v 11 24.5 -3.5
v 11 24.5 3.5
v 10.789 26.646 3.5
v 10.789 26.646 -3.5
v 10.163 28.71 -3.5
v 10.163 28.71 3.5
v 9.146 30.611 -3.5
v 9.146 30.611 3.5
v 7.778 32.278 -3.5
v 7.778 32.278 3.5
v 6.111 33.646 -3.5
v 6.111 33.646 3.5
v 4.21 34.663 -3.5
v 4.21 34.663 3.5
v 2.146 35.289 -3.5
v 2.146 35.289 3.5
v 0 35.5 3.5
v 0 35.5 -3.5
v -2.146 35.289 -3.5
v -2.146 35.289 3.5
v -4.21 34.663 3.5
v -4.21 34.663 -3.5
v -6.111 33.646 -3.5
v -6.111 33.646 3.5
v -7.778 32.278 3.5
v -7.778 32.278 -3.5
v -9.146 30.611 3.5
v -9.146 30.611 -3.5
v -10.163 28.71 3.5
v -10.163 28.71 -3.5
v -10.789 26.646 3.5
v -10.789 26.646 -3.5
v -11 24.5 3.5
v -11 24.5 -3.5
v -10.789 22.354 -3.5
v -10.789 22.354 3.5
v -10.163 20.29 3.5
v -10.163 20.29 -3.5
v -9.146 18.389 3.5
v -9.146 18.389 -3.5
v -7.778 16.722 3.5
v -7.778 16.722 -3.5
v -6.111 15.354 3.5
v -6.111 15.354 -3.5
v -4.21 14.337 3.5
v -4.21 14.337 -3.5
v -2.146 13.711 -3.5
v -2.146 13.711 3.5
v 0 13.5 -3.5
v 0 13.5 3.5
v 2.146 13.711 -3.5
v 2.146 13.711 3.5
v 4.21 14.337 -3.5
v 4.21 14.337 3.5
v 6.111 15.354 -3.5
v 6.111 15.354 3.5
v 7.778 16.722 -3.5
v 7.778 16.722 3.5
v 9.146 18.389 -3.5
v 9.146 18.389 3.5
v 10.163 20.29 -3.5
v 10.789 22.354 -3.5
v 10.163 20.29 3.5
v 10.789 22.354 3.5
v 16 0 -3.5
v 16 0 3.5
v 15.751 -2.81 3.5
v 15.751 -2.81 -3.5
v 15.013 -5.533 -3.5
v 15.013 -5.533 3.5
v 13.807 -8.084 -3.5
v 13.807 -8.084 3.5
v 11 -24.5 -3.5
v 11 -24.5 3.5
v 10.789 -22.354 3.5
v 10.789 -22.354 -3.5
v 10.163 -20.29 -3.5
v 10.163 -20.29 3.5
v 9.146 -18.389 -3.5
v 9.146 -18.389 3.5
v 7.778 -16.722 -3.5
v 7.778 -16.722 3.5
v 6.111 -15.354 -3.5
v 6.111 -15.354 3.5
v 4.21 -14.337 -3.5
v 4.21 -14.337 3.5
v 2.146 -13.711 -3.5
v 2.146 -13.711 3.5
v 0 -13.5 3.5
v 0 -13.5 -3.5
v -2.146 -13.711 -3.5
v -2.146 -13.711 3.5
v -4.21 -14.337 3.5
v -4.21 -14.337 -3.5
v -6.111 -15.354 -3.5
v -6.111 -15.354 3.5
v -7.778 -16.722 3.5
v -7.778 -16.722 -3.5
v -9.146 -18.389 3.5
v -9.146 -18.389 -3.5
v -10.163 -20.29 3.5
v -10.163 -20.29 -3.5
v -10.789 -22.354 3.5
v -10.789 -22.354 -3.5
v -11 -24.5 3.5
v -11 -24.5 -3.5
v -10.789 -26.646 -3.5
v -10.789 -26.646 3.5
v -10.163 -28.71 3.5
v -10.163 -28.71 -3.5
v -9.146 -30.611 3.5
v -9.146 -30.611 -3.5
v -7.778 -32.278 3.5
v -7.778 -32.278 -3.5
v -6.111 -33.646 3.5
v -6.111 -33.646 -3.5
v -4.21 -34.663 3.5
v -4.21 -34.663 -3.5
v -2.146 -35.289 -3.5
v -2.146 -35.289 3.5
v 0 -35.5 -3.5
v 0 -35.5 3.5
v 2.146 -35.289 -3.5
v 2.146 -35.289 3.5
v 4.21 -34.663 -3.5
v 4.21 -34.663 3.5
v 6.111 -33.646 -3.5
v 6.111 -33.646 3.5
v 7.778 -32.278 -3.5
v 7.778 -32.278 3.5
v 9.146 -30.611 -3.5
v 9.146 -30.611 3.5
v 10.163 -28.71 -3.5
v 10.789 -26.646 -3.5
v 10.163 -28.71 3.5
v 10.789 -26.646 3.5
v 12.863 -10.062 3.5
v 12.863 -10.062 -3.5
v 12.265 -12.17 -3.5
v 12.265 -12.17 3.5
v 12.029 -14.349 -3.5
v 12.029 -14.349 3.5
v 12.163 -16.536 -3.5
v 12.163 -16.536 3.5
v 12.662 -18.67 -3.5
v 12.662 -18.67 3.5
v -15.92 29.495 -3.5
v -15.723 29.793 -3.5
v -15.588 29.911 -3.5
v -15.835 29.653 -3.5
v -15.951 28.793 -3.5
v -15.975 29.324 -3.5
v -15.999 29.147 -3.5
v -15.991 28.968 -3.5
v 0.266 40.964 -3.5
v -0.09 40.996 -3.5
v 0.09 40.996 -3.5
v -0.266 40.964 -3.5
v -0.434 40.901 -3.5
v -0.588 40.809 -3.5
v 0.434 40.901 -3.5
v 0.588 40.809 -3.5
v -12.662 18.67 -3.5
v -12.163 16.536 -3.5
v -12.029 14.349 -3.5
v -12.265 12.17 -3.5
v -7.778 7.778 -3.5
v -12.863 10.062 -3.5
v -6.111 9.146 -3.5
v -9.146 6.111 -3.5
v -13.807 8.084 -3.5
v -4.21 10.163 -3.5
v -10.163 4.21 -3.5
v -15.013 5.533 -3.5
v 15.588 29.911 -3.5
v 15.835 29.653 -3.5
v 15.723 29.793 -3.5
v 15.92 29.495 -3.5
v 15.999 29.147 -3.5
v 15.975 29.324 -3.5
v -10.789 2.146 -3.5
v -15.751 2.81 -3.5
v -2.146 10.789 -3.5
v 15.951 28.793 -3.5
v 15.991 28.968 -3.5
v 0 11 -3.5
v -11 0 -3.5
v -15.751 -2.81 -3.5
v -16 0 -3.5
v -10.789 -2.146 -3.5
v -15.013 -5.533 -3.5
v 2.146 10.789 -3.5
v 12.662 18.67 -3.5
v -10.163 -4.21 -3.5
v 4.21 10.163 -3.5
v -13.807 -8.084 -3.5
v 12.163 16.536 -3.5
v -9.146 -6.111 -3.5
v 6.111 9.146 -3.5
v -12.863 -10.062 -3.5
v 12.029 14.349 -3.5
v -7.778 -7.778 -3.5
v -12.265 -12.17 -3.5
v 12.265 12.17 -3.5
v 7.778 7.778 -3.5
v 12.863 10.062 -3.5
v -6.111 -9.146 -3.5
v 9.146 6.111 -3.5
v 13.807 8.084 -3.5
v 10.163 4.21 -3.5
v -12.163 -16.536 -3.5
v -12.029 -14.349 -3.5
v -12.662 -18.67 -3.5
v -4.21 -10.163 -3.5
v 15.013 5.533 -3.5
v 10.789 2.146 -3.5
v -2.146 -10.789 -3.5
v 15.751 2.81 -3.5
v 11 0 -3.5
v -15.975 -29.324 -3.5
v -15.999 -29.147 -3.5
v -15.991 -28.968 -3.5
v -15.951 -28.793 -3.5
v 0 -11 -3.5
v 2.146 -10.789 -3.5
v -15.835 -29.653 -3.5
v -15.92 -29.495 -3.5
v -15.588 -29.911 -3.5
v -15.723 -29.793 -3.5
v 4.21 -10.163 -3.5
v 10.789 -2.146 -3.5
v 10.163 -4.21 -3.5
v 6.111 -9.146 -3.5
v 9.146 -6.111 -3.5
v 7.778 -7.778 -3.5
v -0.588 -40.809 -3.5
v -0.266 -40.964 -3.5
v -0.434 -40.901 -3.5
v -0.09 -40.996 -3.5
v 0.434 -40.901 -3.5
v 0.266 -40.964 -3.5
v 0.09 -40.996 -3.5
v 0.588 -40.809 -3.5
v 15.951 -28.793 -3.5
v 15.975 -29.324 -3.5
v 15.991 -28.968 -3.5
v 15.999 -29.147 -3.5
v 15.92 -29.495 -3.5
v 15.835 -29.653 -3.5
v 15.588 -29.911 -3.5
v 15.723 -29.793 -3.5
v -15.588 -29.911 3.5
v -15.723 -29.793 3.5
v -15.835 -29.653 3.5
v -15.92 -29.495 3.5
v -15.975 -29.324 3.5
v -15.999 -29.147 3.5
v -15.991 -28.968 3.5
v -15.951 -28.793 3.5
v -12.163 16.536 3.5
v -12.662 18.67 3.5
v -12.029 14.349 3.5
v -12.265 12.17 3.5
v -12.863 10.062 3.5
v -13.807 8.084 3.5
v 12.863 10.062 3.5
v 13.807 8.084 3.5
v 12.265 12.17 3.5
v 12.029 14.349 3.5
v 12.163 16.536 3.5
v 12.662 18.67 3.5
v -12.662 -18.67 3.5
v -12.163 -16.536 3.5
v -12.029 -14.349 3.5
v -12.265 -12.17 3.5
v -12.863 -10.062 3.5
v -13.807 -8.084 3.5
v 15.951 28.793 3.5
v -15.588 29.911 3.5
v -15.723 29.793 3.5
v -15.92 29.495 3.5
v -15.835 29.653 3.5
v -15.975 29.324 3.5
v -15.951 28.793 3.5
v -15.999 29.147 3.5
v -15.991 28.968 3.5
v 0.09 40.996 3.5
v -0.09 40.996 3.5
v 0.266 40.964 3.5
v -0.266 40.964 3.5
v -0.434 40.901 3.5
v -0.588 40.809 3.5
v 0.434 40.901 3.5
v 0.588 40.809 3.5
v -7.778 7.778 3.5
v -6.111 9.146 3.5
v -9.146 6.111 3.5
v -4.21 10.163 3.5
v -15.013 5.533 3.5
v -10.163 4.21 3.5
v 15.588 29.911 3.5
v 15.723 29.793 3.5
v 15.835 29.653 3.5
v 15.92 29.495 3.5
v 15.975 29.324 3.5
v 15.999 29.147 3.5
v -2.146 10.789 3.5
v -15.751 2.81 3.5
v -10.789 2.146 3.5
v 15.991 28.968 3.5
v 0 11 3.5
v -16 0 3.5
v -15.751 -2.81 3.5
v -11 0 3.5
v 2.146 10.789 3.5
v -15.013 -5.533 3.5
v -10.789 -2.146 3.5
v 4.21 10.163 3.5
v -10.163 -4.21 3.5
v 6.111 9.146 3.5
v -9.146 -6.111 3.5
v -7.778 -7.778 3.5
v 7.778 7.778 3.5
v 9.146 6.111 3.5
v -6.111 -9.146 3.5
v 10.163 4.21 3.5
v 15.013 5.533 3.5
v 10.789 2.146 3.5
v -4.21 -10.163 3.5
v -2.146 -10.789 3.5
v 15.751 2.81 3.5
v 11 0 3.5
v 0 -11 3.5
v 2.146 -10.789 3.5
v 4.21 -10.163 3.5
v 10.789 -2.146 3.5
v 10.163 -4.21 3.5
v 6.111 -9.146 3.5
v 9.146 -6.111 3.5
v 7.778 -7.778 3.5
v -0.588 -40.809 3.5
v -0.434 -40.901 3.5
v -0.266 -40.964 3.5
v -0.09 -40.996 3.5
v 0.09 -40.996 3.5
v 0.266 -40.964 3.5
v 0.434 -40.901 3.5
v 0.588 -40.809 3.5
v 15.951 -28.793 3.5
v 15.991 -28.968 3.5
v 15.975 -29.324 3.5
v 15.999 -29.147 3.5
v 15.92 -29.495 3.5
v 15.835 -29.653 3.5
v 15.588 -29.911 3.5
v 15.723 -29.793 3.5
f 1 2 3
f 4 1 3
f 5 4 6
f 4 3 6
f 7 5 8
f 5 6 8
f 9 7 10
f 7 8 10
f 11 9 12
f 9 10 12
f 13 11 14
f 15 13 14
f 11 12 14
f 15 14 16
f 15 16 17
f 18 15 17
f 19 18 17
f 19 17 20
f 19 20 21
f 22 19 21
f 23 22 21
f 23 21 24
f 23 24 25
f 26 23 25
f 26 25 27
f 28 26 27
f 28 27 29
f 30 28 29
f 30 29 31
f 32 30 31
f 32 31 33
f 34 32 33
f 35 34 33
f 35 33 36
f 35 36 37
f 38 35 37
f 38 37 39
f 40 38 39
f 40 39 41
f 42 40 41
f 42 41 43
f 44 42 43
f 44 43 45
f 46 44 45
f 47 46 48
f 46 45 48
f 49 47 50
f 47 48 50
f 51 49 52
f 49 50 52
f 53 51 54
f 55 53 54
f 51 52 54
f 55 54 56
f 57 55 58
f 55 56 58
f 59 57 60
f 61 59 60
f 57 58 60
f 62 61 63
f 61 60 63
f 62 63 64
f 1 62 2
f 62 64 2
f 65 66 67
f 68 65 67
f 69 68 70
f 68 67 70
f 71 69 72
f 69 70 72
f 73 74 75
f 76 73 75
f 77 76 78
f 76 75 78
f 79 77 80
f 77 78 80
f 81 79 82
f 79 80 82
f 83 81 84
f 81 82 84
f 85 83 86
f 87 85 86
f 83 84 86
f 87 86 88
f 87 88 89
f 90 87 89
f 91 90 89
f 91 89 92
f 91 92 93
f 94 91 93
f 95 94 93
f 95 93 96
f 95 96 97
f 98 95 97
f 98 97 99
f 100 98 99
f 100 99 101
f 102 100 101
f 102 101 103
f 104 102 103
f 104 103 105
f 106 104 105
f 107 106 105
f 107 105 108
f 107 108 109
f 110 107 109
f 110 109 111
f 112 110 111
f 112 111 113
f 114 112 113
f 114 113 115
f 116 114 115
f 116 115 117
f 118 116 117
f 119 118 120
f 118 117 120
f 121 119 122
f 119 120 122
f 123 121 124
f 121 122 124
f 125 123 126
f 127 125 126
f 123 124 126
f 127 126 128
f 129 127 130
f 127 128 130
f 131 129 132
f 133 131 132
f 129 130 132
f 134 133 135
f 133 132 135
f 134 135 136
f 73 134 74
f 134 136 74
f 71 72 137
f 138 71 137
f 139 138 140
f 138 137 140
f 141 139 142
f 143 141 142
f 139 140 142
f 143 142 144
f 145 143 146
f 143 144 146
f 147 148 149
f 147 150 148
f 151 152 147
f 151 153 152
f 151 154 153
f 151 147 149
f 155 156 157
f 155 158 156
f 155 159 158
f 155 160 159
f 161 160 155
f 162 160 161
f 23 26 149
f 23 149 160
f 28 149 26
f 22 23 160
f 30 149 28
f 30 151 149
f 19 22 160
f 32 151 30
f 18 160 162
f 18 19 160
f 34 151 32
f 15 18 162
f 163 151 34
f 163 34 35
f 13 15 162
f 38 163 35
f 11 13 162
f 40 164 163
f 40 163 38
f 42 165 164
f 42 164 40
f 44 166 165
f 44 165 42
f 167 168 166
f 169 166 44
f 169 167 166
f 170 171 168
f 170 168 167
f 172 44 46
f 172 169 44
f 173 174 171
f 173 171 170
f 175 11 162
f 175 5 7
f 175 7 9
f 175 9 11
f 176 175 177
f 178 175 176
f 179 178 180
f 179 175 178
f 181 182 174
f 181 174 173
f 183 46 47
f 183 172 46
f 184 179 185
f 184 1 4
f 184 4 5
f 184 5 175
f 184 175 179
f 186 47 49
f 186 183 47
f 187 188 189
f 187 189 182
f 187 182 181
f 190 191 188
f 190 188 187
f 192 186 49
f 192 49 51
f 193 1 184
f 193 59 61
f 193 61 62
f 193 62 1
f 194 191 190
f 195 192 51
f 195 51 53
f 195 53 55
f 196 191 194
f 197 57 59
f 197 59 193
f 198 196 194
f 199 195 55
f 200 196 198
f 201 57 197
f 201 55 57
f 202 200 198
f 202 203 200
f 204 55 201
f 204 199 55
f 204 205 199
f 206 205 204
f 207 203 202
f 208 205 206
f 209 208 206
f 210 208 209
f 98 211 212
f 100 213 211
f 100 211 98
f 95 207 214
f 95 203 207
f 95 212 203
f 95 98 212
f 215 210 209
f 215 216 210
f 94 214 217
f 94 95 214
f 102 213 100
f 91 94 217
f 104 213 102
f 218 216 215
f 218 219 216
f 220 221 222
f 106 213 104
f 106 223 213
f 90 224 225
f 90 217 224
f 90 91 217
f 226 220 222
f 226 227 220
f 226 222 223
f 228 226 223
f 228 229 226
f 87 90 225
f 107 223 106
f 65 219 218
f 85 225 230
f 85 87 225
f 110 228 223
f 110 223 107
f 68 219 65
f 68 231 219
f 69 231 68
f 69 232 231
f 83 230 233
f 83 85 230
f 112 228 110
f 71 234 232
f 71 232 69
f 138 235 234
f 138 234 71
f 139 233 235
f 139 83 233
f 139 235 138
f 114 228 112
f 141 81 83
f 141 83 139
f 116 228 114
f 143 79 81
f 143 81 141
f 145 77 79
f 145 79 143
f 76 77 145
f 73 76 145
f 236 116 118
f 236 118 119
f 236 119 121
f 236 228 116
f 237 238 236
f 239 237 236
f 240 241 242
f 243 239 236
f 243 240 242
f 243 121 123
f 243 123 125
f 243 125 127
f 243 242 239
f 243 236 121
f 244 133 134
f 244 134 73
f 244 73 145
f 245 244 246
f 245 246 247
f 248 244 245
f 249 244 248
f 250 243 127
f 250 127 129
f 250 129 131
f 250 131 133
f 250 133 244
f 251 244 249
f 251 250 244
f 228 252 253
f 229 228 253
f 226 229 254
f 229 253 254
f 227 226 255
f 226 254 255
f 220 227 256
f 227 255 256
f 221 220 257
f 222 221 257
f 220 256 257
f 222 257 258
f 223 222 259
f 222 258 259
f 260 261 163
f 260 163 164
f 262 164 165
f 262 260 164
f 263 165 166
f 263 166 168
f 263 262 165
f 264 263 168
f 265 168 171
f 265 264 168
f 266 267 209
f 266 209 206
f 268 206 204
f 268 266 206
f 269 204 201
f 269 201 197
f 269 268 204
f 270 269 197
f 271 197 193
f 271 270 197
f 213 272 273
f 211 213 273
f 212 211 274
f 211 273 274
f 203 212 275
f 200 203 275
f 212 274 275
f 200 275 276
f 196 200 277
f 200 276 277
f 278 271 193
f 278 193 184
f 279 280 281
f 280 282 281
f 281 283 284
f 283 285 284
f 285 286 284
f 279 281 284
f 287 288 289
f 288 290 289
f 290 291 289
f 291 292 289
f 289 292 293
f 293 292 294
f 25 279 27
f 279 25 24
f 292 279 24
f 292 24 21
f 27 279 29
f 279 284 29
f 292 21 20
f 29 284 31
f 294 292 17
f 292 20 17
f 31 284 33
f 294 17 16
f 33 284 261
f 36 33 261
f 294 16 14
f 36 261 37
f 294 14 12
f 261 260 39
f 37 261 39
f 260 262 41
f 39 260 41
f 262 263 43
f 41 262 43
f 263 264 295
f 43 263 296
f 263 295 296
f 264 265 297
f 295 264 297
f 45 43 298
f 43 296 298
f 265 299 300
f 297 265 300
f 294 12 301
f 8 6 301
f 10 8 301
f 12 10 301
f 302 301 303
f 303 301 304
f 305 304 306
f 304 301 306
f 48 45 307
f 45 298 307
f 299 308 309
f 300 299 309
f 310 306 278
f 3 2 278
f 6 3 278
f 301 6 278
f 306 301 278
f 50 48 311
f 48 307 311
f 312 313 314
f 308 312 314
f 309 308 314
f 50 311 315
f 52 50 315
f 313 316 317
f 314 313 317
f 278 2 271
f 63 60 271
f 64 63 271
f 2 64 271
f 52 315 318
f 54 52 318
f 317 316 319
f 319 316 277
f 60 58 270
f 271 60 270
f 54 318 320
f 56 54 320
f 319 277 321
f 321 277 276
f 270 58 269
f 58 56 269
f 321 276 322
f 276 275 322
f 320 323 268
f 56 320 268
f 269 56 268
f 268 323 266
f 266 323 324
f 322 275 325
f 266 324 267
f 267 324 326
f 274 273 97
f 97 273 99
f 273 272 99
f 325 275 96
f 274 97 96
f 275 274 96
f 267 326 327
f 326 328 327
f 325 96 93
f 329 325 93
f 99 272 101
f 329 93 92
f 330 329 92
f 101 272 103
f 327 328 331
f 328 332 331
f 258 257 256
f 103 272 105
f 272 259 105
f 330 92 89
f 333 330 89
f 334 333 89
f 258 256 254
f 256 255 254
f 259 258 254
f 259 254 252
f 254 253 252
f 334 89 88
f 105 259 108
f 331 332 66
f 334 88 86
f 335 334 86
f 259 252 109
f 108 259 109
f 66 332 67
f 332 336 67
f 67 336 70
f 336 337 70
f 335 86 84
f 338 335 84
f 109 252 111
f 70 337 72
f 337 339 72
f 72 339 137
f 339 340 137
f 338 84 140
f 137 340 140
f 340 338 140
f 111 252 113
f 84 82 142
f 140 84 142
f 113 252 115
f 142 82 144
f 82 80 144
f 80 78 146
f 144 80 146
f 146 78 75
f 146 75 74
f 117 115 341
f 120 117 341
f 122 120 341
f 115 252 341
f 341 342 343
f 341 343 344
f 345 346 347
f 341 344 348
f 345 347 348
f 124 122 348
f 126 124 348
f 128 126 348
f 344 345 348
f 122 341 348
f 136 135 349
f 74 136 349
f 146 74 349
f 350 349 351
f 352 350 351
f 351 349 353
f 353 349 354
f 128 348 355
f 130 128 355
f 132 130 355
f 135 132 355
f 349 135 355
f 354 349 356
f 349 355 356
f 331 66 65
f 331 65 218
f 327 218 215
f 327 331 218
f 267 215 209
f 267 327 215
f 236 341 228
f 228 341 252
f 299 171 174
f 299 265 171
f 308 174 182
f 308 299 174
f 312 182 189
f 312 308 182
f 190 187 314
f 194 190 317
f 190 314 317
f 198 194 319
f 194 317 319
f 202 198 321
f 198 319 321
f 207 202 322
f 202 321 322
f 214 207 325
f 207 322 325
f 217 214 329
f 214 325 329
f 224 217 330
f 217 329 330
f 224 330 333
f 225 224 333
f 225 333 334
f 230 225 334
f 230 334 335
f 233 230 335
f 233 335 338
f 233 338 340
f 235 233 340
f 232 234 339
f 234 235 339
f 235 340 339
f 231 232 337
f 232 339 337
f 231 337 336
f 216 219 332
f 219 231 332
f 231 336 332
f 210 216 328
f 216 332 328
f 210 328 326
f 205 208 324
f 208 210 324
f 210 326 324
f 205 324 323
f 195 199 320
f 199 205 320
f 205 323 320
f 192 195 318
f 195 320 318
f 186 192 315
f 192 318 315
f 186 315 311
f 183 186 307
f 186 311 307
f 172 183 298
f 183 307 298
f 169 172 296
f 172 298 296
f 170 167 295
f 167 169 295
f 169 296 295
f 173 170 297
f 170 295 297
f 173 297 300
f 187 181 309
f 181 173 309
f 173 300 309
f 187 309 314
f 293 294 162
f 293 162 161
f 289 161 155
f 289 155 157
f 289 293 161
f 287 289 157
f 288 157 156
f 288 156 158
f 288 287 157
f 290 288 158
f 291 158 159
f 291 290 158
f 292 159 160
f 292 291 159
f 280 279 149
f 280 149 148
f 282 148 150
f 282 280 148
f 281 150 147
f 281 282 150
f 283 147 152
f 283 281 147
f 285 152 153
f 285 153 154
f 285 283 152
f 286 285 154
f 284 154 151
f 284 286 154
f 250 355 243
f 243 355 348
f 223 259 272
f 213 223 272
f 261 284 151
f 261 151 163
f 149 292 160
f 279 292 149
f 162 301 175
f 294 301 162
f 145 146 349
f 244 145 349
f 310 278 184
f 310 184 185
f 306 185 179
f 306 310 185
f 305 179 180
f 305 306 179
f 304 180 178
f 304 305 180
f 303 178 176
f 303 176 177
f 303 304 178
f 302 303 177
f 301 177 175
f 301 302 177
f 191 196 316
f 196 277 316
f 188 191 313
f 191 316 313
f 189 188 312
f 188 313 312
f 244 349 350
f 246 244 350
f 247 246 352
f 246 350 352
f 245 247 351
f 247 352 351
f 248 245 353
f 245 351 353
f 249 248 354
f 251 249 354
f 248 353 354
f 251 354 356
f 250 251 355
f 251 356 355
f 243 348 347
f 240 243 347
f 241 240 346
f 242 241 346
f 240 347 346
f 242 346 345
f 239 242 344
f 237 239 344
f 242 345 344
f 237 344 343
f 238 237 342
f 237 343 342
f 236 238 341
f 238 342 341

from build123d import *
from build123d import SkipClean  # not in build123d's __all__

# Parameters (mm, degrees)
F1_DEPTH = 3.5
F3_R     = 11
F4_DEPTH = 7.001


with BuildPart() as f1:
    # F0 (on Top) → F1 (new body, symmetric)
    with BuildSketch(Plane.XY):
        with BuildLine():
            ThreePointArc((-11, 0), (0, 11), (11, 0))
            Line((11, 0), (16, 0))
            ThreePointArc((16, 0), (15.4421025537, 4.1882536601), (13.8073164099, 8.0844303175))
            ThreePointArc((13.8073164099, 8.0844303175), (12.1011838507, 13.2547074929), (12.6620262811, 18.6702508773))
            Line((12.6620262811, 18.6702508773), (15.9510565163, 28.7928450855))
            ThreePointArc((15.9510565163, 28.7928450855), (15.9510565163, 29.4108790743), (15.5877852523, 29.9108790743))
            Line((15.5877852523, 29.9108790743), (0.5877852523, 40.8090169944))
            ThreePointArc((0.5877852523, 40.8090169944), (0, 41), (-0.5877852523, 40.8090169944))
            Line((-0.5877852523, 40.8090169944), (-15.5877852523, 29.9108790743))
            ThreePointArc((-15.5877852523, 29.9108790743), (-15.9510565163, 29.4108790743), (-15.9510565163, 28.7928450855))
            Line((-15.9510565163, 28.7928450855), (-12.6620262811, 18.6702508773))
            ThreePointArc((-12.6620262811, 18.6702508773), (-12.1011838507, 13.2547074929), (-13.8073164099, 8.0844303175))
            ThreePointArc((-13.8073164099, 8.0844303175), (-15.4421025537, 4.1882536601), (-16, 0))
            Line((-16, 0), (-11, 0))
        make_face()
    extrude(amount=F1_DEPTH, both=True)

    # F2: F1 across face


with BuildPart() as f1_1:
    add(f1.part, clean=False)
    with SkipClean():  # cleaning this boolean's faces spoils the solid; the shape is the same uncleaned
        add(f1.part.mirror(Plane(origin=(-13.5, 0, 0), x_dir=(1, 0, 0), z_dir=(0, -1, 0))), clean=False)

    # F3 (on face) → F4 (cut, through all)
    with BuildSketch(Plane.XY.offset(3.5)):
        with Locations((0, 24.5)):
            Circle(F3_R)
        with Locations((0, -24.5)):
            Circle(F3_R)
    extrude(amount=-F4_DEPTH, mode=Mode.SUBTRACT)


solid = f1_1.part
